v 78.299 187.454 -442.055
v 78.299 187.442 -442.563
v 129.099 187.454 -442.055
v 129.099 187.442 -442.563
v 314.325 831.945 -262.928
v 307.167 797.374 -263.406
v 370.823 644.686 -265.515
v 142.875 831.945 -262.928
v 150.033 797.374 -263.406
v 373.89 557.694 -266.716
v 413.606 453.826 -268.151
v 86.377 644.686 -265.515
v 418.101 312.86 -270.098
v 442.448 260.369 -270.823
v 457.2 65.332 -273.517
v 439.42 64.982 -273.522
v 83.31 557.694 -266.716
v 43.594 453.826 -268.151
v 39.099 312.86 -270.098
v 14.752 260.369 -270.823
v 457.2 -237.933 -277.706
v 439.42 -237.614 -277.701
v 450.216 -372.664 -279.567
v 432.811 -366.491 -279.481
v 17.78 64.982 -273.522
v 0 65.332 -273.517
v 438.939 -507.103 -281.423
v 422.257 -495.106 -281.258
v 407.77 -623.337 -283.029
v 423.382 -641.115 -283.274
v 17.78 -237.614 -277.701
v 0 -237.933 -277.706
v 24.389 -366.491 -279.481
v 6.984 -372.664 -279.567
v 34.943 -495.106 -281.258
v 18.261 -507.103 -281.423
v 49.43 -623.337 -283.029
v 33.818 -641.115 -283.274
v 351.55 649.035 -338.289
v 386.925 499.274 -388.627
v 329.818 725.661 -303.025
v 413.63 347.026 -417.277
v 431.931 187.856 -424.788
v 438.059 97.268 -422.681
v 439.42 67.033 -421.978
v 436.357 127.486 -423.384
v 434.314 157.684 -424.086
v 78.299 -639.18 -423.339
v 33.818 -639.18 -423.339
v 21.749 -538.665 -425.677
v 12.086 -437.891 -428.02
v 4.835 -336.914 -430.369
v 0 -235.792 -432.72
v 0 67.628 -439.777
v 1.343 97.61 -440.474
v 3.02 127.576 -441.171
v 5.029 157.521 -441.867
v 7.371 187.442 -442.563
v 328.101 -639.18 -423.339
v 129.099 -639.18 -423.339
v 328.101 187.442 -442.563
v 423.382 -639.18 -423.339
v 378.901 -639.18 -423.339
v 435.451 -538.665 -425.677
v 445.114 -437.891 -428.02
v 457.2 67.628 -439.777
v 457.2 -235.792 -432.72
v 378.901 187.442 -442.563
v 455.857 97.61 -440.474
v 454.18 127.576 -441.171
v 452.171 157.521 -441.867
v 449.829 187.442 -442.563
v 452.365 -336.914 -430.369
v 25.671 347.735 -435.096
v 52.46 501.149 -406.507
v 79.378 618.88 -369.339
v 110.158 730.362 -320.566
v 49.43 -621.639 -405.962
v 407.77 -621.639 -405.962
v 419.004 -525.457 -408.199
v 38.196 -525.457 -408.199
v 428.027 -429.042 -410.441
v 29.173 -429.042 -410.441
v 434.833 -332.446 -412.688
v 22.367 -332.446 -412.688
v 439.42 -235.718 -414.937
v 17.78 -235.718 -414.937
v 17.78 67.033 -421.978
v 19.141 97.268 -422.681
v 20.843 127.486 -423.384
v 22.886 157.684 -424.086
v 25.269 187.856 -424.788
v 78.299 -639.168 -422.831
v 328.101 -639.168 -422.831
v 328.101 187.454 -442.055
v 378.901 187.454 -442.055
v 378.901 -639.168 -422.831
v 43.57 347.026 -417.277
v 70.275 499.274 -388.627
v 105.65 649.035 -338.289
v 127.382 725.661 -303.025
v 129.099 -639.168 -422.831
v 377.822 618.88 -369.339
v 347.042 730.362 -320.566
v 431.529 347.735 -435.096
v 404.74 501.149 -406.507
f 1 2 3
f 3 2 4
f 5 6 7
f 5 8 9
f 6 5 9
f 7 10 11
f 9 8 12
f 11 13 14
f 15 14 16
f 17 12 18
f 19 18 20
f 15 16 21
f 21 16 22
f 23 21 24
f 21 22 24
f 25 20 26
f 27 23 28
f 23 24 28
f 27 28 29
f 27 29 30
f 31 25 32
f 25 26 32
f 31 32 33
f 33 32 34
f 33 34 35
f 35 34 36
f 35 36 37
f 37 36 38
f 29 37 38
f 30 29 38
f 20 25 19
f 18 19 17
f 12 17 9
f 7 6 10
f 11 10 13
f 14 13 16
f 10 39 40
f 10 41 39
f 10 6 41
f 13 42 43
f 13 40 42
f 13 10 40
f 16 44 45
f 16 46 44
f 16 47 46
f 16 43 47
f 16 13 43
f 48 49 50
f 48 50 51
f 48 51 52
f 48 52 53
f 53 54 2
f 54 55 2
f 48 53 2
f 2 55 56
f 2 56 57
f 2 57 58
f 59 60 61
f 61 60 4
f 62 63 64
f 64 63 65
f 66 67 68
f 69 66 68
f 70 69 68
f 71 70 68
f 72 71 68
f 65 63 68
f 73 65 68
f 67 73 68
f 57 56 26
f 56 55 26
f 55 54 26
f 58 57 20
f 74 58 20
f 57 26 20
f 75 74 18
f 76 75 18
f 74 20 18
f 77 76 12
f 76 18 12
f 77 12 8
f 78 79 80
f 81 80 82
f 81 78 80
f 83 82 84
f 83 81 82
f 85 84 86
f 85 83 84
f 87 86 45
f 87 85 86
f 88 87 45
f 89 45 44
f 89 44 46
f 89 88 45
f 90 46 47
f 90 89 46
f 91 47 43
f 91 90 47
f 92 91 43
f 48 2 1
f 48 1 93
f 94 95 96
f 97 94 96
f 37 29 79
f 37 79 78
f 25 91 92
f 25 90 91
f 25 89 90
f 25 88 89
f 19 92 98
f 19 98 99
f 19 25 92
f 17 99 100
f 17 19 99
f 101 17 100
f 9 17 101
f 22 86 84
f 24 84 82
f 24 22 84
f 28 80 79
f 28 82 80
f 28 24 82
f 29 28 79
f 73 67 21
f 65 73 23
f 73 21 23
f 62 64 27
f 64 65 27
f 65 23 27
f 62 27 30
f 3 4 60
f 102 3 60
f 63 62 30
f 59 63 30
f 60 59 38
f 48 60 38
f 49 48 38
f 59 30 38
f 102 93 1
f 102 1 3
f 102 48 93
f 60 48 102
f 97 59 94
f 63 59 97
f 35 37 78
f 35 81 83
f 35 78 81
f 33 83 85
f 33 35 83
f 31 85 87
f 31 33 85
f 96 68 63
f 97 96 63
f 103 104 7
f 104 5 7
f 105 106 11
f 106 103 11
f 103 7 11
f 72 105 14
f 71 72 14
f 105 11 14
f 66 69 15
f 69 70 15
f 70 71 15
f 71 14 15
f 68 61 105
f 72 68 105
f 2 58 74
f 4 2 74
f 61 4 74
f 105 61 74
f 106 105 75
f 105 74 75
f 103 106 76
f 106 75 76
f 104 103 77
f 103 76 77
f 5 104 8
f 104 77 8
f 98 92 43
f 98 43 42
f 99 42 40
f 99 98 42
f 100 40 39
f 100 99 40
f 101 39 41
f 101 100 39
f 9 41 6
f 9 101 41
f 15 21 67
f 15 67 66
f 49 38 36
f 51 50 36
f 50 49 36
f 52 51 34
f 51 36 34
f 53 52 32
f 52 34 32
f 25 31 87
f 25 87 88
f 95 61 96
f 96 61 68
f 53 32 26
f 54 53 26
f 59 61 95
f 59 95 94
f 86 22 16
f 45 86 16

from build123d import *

# Parameters (mm, degrees)
F1_DEPTH = 457.2
F3_DEPTH = 254
F4_T     = 17.78
F5_W     = 50.8
F5_H     = 826.8460257717
F6_DEPTH = 0.508


# Not quite as in the source:
# - a shell that OpenCascade refuses in one call is made with other operations: the cavity is built on its own and cut out


with BuildPart() as f1:
    # F0 (on Right) → F1 (new body)
    with BuildSketch(Plane.YZ):
        with BuildLine():
            Line((288.924485445, -270.4285681248), (-641.1148309708, -283.2744121552))
            Line((-641.1148309708, -283.2744121552), (-641.1148309708, -423.2941567898))
            Line((-641.1148309708, -423.2941567898), (187.4422878027, -442.5629377365))
            ThreePointArc((187.4422878027, -442.5629377365), (523.0417315747, -400.6371692989), (831.9446638759, -262.9282910995))
            Line((831.9446638759, -262.9282910995), (288.924485445, -270.4285681248))
        make_face()
    extrude(amount=F1_DEPTH)

    # F2 (on face) → F3 (cut)
    with BuildSketch(Plane(origin=(0, 3.7895971393, -274.3668944279), x_dir=(1, 0, 0), z_dir=(0, -0.0138108343, 0.9999046259))):
        with BuildLine():
            Line((423.3823697388, -644.965941169), (615.9012913704, -644.965941169))
            Line((615.9012913704, -644.965941169), (483.5176634908, 828.234058831))
            Line((483.5176634908, 828.234058831), (457.2, 61.5478307009))
            ThreePointArc((457.2, 61.5478307009), (455.0788529219, -292.4168742611), (423.3823697388, -644.965941169))
        make_face()
        with BuildLine():
            ThreePointArc((0, 61.5478307009), (43.5944295305, 450.079610673), (142.875, 828.234058831))
            Line((142.875, 828.234058831), (0, 828.234058831))
            Line((0, 828.234058831), (-26.3176634908, 828.234058831))
            Line((-26.3176634908, 828.234058831), (0, 61.5478307009))
        make_face()
        with BuildLine():
            ThreePointArc((33.8176302612, -644.965941169), (2.1211470781, -292.4168742611), (0, 61.5478307009))
            Line((0, 61.5478307009), (-26.3176634908, 828.234058831))
            Line((-26.3176634908, 828.234058831), (-361.6100847721, -644.965941169))
            Line((-361.6100847721, -644.965941169), (33.8176302612, -644.965941169))
        make_face()
        with BuildLine():
            Line((457.2, 61.5478307009), (483.5176634908, 828.234058831))
            Line((483.5176634908, 828.234058831), (457.2, 828.234058831))
            Line((457.2, 828.234058831), (314.325, 828.234058831))
            ThreePointArc((314.325, 828.234058831), (413.6055704695, 450.079610673), (457.2, 61.5478307009))
        make_face()
        Polygon((0, -644.965941169), (-361.6100847721, -644.965941169), (237.2898459435, -852.3167967796), (615.9012913704, -644.965941169), (457.2, -644.965941169), (423.3823697388, -644.965941169), (33.8176302612, -644.965941169), align=None)
    extrude(amount=-F3_DEPTH, mode=Mode.SUBTRACT)

    # F4: shell of thickness 17.78, made by hand


with BuildPart() as f4_core1:
    # F4_t2: copy of F1
    add(f1.part)

    # the walls: a layer under each face that stays
    f4_faces = [f4_core1.faces().sort_by_distance(p)[0] for p in [
        (228.6, 523.0417315747, -400.6371692989),
        (43.5944295305, 455.0197886911, -354.5608330612),
        (413.6055704695, 455.0197886911, -354.5608330612),
        (228.6, -225.8689739056, -432.9510425705),
        (0, -85.1524982143, -356.6467120233),
        (12.0864906617, -438.857755801, -358.0029304556),
        (228.6, -640.1475332924, -353.3067797799),
        (445.1135093383, -438.857755801, -358.0029304556),
        (457.2, -85.1524982143, -356.6467120233),
    ]]
    thicken(f4_faces, amount=-F4_T, mode=Mode.SUBTRACT)


with BuildPart() as f1_1:
    add(f1.part)

    # what is left inside the walls is the cavity
    f4_cavity = [f4_core1.part.solids().sort_by_distance(p)[0] for p in [
        (298.873333, 87.021104, -273.395105),
    ]]
    add(f4_cavity, mode=Mode.SUBTRACT)

    # F5 (on face) → F6 (cut)
    with BuildSketch(Plane(origin=(0, -10.1852834725, -437.9669451445), x_dir=(1, 0, 0), z_dir=(0, -0.0232495407, -0.9997296929))):
        with Locations((103.6994478941, 215.7420070303)):
            Rectangle(F5_W, F5_H)
        with Locations((353.5005521059, 215.7420070303)):
            Rectangle(F5_W, F5_H)
    extrude(amount=-F6_DEPTH, mode=Mode.SUBTRACT)


solid = f1_1.part
